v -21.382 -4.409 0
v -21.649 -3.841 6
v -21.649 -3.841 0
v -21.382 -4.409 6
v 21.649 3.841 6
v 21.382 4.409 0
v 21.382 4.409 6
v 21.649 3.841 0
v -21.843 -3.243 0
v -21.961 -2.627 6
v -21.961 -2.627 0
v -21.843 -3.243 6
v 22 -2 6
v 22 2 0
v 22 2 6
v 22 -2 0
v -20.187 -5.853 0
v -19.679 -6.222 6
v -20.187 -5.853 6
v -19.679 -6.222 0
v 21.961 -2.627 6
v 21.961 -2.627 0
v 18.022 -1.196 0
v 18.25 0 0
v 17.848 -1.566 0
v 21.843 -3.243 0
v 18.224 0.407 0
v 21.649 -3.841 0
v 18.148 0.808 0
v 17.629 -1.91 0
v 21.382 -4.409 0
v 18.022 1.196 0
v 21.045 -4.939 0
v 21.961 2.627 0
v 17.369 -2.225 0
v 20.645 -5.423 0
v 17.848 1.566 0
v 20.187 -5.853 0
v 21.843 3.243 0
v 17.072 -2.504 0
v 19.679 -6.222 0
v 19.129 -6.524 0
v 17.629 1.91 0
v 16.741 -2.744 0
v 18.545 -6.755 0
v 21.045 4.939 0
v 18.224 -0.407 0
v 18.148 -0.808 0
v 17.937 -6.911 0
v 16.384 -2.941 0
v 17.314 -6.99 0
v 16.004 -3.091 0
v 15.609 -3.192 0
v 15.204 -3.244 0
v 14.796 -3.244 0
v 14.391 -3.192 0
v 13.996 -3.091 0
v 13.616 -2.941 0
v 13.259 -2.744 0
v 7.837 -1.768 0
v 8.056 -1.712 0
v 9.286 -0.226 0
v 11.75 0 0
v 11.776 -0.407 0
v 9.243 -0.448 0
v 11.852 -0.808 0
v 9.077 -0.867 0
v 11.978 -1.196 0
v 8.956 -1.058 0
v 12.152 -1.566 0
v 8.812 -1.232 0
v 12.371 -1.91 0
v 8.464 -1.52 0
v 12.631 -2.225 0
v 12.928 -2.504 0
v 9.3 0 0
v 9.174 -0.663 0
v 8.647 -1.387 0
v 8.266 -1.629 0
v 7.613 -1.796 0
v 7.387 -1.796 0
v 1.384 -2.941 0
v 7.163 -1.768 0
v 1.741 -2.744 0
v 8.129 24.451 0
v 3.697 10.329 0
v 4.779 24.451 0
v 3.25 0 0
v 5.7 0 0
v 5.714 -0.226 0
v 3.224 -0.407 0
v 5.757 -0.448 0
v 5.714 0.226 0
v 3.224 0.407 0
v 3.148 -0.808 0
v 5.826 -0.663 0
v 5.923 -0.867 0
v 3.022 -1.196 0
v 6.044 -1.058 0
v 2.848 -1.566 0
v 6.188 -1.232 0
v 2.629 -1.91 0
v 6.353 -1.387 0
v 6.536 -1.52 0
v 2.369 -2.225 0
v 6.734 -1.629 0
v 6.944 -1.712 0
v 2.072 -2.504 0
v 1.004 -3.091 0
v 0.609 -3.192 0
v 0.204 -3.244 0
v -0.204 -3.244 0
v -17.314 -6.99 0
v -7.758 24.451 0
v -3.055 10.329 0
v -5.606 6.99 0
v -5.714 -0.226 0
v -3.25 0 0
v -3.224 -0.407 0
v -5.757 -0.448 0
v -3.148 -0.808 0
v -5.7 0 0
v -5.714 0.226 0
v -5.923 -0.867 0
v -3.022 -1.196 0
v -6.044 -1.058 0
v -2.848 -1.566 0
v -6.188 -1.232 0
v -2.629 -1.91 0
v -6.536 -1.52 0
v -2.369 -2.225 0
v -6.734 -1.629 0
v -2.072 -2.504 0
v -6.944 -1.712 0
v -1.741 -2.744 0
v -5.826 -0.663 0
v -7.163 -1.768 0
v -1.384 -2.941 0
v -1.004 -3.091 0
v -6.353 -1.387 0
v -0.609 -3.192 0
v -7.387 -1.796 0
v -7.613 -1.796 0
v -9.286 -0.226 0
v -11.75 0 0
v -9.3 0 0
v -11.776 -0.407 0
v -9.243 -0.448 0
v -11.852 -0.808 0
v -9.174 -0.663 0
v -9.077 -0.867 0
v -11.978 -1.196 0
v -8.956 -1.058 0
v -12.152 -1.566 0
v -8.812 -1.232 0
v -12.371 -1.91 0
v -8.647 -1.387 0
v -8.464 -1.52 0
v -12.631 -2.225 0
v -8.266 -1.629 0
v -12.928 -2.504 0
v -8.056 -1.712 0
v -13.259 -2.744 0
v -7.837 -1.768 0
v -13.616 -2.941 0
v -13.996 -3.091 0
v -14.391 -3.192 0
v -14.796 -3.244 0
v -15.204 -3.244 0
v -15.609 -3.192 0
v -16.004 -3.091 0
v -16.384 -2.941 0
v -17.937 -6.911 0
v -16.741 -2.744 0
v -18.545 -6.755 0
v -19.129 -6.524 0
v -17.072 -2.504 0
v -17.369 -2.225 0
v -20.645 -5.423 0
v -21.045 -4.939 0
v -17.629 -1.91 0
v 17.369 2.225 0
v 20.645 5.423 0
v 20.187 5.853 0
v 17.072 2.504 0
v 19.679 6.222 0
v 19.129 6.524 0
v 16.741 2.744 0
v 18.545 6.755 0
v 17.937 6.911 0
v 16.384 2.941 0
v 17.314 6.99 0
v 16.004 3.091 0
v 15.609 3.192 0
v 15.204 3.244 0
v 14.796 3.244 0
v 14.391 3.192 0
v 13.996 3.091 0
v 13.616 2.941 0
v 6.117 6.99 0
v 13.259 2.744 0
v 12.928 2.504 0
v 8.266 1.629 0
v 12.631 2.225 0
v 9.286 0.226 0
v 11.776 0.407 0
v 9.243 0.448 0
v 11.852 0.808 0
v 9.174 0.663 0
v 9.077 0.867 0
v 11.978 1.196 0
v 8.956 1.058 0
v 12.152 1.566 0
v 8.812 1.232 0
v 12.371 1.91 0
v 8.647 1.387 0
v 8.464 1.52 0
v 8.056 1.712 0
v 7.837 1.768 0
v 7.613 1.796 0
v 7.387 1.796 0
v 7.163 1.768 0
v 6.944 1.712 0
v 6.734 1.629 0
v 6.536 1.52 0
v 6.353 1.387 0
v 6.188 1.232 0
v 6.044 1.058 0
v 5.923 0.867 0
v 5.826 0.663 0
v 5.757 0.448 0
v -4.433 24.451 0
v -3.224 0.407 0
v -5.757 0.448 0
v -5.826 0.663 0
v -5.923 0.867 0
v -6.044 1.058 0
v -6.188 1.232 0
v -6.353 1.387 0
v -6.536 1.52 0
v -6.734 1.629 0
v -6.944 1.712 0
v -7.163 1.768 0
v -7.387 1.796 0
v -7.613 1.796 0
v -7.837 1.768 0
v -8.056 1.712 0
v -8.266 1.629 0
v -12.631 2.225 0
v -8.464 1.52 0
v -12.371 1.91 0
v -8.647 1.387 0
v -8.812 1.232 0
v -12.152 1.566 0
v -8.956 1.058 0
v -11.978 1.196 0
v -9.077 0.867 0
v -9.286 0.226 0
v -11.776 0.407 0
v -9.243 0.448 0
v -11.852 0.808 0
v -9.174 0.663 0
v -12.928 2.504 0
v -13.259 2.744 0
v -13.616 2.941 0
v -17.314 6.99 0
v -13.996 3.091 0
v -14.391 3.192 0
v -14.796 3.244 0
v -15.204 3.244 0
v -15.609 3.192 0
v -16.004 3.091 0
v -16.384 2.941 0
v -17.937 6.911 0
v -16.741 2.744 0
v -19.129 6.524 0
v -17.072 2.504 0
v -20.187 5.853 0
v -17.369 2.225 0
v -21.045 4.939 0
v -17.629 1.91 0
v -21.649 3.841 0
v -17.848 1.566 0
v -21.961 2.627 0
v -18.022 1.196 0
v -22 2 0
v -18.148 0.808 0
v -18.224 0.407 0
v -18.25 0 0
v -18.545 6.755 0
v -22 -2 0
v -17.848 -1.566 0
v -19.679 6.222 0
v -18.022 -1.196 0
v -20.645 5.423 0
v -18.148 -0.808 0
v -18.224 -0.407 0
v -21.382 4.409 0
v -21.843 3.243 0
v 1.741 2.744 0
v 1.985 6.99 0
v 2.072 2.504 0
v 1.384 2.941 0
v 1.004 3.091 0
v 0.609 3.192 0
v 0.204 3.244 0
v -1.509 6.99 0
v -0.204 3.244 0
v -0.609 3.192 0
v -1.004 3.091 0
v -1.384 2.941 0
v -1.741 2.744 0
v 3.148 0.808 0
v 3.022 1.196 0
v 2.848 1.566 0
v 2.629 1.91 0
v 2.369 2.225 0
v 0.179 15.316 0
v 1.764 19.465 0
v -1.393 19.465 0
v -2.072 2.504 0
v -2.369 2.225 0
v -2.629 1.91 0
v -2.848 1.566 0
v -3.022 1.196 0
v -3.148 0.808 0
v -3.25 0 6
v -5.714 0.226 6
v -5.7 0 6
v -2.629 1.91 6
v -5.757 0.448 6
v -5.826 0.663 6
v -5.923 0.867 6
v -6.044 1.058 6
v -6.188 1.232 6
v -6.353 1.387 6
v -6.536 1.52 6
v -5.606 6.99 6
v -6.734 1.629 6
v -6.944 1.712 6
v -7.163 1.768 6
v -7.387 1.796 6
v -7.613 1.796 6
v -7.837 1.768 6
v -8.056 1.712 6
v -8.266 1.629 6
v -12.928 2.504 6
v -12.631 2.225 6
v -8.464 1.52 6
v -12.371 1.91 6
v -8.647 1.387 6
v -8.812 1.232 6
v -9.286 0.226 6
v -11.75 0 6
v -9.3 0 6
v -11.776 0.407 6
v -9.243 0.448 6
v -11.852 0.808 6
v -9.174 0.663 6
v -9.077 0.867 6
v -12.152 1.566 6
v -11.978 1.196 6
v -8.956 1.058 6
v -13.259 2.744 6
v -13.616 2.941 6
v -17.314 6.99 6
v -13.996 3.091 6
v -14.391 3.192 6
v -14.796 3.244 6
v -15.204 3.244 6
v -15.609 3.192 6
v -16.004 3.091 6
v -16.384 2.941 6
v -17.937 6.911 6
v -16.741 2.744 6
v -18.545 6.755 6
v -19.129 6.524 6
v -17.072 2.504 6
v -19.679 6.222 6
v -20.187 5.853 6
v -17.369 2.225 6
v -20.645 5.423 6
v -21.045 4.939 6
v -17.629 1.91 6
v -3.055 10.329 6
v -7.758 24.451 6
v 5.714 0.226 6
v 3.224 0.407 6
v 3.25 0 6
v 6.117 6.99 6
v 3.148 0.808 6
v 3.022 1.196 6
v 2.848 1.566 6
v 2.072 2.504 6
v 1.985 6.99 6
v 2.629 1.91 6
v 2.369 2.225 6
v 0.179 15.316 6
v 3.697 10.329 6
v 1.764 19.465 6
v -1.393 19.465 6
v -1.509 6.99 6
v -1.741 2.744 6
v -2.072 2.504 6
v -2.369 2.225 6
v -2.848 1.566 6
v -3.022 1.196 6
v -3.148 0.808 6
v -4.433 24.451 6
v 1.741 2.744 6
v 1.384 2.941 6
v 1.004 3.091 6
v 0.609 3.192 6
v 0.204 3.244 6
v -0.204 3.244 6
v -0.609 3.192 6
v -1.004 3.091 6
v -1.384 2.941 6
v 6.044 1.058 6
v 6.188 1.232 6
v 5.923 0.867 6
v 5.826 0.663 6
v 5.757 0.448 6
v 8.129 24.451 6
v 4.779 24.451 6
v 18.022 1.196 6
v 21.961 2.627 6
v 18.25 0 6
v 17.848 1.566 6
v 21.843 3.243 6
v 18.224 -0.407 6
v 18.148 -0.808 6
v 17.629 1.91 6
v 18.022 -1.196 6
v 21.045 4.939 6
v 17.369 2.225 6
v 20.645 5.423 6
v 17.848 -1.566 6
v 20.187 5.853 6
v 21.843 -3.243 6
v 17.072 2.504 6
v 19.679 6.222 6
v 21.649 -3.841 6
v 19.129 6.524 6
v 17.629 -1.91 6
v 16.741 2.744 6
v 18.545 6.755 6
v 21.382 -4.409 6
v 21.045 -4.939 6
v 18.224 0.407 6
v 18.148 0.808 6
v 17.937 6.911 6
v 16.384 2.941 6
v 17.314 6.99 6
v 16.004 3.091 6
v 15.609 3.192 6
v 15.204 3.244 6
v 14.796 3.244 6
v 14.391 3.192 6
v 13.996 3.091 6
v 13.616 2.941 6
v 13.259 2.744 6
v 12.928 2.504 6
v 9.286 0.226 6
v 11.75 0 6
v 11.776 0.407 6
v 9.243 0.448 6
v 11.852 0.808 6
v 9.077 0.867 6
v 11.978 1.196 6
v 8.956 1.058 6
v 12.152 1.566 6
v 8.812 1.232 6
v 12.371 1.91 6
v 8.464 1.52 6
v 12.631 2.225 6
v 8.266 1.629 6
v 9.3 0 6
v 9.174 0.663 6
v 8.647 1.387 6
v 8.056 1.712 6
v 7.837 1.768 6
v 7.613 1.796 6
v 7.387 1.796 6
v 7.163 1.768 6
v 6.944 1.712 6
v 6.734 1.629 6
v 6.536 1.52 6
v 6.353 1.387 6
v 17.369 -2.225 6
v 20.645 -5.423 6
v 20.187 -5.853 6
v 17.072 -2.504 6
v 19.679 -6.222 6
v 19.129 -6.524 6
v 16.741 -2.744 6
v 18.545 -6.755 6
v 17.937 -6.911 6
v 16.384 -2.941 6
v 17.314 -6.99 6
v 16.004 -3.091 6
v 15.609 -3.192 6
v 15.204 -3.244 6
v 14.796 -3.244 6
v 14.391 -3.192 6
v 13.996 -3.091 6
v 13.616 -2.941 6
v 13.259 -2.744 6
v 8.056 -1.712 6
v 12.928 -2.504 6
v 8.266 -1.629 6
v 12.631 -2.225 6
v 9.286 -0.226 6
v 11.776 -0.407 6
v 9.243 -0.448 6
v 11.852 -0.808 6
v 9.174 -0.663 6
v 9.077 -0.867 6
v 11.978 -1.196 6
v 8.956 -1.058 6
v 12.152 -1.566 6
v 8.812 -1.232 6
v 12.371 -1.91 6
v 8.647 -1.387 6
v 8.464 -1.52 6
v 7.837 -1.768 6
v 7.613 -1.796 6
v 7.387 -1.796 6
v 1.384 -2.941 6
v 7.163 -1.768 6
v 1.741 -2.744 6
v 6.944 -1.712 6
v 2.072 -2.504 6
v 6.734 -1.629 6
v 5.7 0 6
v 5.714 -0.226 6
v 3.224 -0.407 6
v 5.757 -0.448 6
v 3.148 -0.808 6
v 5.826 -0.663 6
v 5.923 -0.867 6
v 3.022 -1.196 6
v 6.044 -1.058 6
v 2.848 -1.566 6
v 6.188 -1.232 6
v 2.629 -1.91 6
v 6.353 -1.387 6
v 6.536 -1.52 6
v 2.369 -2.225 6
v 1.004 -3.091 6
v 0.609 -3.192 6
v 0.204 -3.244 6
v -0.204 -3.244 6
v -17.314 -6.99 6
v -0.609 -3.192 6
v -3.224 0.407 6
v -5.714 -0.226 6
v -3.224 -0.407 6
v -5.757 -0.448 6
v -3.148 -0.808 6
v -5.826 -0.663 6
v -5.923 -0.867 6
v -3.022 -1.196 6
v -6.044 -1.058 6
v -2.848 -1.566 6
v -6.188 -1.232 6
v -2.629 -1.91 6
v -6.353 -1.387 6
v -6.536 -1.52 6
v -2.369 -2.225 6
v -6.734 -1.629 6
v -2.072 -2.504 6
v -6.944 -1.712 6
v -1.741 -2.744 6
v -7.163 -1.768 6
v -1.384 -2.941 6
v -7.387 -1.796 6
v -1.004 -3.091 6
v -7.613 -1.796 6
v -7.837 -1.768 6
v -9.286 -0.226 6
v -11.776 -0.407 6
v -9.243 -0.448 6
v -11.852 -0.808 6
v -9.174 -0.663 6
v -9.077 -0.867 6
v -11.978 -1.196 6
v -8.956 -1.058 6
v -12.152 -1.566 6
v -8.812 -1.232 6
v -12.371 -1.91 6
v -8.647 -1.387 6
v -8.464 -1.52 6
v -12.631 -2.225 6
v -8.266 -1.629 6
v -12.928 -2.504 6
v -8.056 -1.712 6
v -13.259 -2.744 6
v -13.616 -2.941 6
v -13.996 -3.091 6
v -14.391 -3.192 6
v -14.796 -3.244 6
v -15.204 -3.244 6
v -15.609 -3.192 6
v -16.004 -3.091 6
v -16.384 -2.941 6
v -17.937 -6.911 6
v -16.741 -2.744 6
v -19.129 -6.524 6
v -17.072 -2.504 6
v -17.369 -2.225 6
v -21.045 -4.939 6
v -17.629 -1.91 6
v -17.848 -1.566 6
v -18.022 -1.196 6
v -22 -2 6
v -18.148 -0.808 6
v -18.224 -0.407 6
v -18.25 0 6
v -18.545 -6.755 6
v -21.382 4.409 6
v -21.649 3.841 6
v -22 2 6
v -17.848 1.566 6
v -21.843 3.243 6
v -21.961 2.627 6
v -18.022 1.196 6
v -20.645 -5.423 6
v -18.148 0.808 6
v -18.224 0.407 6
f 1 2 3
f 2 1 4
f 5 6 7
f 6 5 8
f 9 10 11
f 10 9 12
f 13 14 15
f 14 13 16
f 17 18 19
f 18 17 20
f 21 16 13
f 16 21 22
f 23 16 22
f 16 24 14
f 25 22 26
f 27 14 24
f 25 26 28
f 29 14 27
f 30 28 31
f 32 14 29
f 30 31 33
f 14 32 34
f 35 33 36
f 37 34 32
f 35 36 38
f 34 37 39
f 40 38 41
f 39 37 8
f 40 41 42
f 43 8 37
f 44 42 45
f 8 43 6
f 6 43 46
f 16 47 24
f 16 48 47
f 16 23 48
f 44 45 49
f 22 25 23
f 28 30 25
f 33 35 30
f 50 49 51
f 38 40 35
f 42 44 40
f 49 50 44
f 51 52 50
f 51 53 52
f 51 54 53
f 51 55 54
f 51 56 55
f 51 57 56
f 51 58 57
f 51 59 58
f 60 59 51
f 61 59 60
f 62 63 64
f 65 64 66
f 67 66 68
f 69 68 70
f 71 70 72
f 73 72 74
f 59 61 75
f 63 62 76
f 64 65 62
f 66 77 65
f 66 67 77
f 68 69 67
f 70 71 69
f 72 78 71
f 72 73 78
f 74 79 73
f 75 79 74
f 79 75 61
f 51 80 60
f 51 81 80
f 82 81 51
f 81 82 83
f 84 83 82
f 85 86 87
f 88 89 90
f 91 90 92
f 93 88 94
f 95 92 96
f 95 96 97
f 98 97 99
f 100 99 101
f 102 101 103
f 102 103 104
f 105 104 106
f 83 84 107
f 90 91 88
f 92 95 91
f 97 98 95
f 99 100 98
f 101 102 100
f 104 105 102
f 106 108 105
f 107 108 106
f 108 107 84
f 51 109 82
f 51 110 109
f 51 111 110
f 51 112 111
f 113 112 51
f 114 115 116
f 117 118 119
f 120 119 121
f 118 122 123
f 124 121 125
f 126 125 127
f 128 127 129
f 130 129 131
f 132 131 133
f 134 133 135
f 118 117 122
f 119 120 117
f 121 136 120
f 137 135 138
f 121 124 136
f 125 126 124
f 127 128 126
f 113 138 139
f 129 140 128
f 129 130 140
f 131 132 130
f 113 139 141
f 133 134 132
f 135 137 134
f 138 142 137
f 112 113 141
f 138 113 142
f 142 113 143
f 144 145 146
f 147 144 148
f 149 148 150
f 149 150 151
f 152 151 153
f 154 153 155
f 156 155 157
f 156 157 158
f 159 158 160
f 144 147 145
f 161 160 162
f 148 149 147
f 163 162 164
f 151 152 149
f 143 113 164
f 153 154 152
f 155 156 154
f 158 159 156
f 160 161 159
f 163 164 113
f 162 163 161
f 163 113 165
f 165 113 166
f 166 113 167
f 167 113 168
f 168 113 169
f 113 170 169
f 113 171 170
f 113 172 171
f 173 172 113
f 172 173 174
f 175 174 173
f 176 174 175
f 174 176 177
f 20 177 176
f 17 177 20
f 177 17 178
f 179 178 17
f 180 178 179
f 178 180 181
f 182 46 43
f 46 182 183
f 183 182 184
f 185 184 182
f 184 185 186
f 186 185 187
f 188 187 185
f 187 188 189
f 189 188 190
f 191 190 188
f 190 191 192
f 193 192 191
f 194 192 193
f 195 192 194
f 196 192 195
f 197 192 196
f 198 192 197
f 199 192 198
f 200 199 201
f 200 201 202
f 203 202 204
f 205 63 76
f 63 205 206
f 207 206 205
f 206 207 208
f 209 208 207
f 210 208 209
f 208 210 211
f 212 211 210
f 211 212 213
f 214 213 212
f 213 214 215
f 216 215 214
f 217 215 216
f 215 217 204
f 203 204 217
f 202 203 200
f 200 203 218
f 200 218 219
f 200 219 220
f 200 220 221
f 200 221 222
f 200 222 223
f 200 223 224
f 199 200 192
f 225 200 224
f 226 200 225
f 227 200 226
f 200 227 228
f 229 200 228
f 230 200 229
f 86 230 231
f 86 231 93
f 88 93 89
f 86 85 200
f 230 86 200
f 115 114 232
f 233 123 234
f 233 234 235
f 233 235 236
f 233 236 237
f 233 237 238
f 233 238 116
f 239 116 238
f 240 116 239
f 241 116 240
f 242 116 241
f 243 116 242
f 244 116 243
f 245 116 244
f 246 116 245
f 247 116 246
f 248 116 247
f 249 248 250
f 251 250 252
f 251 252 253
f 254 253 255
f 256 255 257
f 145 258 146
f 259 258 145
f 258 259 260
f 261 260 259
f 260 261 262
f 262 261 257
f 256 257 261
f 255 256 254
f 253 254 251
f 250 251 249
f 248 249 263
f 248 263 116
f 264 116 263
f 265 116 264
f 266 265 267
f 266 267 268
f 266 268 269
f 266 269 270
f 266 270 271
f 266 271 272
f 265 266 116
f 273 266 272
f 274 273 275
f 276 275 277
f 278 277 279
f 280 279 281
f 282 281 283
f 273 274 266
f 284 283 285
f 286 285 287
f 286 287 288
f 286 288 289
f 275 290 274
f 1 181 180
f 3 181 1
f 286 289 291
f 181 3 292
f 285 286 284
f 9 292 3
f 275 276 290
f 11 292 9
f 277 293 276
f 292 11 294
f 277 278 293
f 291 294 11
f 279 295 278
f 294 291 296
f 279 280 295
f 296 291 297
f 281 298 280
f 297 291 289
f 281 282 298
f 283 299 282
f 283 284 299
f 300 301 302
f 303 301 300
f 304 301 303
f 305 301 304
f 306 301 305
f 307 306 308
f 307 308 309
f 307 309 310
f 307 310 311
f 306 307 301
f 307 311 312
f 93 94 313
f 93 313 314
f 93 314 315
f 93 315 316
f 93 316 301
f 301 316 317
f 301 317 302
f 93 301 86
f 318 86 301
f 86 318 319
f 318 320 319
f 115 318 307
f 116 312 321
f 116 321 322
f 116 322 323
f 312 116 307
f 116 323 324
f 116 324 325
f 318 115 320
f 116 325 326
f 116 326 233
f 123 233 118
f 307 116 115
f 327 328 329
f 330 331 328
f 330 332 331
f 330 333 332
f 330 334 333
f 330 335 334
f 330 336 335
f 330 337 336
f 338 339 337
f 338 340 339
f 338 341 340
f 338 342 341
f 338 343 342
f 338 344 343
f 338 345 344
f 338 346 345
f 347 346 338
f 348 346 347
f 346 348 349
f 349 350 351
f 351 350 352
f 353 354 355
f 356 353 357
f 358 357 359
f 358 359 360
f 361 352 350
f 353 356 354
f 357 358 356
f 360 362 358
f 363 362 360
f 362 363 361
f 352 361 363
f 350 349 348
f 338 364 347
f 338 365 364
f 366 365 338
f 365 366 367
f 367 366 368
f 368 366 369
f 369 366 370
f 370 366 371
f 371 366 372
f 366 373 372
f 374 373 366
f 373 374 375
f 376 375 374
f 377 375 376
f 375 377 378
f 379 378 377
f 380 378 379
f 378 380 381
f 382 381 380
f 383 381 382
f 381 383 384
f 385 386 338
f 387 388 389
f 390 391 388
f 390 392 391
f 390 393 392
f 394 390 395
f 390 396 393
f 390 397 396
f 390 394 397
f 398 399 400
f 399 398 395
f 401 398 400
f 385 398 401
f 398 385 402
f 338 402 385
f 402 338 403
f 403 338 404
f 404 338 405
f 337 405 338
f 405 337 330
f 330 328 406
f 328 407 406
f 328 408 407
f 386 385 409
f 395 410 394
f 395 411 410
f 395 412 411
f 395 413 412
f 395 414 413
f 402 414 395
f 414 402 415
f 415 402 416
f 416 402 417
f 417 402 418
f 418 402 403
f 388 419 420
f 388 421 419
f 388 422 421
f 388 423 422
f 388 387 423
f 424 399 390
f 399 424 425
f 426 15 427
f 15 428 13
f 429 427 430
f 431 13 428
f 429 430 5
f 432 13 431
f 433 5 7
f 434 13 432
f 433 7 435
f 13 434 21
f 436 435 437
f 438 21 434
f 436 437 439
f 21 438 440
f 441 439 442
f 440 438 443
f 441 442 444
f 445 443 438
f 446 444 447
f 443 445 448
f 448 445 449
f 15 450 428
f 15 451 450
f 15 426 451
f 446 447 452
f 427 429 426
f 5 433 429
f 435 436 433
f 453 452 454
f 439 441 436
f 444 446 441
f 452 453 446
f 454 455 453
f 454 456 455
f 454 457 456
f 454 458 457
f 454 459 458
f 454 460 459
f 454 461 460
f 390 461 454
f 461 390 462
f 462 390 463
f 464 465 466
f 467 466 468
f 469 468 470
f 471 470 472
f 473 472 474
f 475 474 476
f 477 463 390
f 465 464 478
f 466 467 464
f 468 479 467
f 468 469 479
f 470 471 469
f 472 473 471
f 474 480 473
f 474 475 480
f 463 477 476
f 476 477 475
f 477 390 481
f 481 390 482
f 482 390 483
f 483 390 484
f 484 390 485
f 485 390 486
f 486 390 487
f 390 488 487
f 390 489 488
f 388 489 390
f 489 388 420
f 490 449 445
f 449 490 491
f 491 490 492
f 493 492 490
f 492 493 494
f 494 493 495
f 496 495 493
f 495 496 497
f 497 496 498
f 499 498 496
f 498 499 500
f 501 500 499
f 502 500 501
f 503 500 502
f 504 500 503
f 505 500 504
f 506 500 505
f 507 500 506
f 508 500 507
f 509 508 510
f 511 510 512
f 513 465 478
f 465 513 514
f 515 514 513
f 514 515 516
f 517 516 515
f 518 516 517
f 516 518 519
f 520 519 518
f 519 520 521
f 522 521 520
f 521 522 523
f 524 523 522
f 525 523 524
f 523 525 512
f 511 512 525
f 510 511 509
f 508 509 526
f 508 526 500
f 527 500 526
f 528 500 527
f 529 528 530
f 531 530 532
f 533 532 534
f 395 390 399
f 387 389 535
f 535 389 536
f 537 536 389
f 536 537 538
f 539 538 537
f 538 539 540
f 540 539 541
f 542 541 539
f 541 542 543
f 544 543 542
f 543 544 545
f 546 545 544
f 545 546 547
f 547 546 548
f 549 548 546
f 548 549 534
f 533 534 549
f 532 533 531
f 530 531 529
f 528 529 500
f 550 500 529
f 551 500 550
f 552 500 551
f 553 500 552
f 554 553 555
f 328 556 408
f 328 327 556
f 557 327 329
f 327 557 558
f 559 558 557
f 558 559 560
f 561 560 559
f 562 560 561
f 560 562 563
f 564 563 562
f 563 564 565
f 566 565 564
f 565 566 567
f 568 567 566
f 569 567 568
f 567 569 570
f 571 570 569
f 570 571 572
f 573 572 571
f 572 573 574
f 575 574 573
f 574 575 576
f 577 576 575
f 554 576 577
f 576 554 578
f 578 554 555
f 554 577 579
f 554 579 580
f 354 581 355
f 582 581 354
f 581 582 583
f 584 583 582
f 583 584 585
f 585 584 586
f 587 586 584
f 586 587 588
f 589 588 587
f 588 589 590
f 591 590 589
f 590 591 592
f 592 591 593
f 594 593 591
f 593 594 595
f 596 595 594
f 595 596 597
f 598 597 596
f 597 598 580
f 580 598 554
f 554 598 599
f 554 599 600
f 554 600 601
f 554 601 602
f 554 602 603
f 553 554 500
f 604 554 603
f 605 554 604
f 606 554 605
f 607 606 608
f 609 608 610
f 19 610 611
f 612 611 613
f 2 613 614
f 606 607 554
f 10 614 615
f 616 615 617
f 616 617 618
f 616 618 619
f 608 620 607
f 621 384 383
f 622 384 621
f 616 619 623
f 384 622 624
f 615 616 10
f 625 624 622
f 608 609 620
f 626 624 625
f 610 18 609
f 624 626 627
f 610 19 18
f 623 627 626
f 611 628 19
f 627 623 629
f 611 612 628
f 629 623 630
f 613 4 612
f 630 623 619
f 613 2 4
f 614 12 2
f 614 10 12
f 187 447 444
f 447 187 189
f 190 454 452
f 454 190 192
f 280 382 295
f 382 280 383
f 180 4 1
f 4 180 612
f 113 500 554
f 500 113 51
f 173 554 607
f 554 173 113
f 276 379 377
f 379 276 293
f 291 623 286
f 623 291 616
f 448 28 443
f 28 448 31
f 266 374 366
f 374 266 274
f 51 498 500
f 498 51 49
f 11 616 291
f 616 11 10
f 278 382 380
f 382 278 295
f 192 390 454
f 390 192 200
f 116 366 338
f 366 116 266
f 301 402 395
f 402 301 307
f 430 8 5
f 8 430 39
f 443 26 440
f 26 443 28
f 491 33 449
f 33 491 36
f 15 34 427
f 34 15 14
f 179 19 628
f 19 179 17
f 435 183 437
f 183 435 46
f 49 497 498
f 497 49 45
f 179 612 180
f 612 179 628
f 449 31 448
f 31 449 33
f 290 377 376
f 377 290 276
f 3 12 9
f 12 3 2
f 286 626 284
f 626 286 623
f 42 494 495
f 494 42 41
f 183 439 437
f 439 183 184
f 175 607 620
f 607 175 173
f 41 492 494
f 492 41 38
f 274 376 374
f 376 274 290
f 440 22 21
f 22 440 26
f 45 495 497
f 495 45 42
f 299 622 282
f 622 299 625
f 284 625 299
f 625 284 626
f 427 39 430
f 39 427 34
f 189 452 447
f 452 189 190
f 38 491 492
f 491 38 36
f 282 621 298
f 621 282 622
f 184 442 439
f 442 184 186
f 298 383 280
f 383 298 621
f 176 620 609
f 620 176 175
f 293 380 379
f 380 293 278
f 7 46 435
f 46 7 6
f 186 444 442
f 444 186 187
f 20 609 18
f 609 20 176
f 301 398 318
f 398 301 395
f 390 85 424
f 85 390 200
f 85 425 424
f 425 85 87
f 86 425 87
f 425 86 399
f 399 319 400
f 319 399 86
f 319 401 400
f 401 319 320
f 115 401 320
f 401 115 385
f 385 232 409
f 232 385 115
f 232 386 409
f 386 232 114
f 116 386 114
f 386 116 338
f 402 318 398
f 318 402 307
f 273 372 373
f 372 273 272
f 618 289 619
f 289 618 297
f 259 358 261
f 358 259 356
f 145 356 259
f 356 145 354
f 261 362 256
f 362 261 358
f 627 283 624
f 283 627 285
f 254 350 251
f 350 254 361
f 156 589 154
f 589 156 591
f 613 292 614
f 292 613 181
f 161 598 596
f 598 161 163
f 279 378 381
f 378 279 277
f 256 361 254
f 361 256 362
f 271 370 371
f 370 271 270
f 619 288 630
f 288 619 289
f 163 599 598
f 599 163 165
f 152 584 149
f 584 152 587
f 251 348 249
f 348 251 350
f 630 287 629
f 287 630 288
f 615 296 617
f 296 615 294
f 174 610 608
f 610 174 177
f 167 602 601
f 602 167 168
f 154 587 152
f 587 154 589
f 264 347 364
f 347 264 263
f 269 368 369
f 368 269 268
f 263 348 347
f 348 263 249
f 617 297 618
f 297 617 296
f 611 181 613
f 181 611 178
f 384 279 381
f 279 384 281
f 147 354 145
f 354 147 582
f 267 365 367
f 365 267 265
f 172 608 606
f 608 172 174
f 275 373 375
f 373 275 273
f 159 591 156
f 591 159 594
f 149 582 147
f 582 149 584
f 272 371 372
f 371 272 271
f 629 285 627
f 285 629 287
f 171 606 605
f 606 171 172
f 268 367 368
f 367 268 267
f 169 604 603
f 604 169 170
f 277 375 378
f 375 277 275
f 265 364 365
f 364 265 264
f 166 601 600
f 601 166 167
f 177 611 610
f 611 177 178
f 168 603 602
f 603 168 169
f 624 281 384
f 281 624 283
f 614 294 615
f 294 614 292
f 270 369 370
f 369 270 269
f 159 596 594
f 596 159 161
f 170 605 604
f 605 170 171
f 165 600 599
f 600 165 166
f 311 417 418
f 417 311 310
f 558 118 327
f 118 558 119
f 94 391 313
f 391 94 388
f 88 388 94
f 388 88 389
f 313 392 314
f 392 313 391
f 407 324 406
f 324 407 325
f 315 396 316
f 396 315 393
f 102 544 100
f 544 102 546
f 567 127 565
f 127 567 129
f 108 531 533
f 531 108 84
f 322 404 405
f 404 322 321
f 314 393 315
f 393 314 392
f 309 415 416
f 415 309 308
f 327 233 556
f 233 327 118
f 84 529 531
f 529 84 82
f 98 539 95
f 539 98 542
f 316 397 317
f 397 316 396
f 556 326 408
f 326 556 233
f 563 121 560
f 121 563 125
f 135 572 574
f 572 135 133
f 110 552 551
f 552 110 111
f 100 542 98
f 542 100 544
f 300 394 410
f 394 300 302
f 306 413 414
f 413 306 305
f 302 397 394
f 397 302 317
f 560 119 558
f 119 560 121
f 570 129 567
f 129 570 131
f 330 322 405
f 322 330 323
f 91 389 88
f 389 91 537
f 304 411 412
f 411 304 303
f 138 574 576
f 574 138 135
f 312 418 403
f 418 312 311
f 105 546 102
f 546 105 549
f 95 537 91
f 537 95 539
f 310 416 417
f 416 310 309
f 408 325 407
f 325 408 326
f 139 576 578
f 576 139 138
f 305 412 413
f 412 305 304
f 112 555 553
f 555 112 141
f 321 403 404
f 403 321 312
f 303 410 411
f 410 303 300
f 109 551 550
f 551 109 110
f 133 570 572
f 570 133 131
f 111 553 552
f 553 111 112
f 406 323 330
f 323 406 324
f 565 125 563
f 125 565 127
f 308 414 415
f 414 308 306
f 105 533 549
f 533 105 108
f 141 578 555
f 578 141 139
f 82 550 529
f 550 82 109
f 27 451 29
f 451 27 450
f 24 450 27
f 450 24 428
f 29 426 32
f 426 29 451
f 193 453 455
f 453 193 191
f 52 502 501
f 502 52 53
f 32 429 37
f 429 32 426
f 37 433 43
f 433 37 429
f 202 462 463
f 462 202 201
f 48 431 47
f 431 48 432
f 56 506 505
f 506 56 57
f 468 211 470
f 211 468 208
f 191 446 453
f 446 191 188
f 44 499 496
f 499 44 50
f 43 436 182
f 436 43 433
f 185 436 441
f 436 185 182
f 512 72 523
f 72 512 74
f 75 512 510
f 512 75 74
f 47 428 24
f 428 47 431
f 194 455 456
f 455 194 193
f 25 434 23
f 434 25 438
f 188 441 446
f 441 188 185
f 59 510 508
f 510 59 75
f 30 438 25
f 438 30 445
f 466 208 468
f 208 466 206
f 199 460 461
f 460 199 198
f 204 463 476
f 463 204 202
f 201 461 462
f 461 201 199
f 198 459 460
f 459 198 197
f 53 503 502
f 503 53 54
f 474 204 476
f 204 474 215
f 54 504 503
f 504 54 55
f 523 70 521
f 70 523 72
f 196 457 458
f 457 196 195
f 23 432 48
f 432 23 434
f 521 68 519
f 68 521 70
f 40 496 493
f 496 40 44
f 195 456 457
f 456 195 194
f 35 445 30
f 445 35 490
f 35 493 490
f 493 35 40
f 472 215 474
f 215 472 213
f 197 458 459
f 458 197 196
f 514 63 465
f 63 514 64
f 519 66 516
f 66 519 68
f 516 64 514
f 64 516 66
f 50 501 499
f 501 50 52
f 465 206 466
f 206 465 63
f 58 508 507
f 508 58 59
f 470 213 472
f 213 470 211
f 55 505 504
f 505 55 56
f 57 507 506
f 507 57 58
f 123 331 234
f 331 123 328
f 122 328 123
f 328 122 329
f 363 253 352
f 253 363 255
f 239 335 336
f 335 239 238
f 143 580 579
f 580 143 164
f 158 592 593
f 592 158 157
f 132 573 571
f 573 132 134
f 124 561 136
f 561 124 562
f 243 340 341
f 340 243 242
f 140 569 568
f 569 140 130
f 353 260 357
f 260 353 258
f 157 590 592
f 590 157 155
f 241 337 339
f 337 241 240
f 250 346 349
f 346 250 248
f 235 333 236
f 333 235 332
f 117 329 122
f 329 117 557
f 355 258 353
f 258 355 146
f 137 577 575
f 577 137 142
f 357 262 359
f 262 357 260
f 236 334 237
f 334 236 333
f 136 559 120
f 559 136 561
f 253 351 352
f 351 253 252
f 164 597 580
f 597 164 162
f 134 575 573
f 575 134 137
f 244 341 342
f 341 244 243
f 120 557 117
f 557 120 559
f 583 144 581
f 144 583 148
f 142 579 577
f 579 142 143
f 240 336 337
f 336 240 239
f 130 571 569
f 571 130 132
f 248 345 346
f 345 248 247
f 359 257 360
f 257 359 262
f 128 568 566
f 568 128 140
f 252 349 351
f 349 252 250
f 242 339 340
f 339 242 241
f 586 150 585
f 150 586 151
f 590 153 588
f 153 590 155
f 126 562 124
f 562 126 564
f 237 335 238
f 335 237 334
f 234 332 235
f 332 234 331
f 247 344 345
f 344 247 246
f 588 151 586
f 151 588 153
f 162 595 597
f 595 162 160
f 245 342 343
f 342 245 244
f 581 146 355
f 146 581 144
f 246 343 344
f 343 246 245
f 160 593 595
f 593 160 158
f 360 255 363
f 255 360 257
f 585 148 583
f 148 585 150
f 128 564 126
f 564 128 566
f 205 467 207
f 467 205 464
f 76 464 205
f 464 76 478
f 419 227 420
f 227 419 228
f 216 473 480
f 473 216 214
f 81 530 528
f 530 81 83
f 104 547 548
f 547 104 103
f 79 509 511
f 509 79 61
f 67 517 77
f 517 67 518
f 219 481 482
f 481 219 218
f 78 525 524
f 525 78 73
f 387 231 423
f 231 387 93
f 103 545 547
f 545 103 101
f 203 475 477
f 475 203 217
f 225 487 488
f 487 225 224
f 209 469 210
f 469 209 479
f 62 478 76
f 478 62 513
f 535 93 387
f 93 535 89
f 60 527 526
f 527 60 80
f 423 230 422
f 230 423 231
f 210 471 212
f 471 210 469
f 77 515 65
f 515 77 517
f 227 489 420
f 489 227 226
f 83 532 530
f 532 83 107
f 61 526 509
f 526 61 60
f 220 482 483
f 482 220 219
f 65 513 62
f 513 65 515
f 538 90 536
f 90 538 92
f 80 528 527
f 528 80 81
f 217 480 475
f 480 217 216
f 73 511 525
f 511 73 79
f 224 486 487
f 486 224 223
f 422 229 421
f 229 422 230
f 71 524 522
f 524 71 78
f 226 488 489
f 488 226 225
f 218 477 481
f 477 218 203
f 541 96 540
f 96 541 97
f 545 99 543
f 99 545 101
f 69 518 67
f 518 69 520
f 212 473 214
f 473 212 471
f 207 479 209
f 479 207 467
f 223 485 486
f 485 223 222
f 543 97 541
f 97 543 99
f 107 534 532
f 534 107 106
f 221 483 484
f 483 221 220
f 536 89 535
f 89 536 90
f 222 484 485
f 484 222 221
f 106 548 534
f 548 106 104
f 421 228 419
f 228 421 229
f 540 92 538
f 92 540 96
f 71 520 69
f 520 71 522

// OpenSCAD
$fn = 50;


difference() {
	union() {
		hull() {
			translate(v = [-17.0000000000, 2.0000000000, 0]) {
				cylinder(h = 6, r = 5);
			}
			translate(v = [17.0000000000, 2.0000000000, 0]) {
				cylinder(h = 6, r = 5);
			}
			translate(v = [-17.0000000000, -2.0000000000, 0]) {
				cylinder(h = 6, r = 5);
			}
			translate(v = [17.0000000000, -2.0000000000, 0]) {
				cylinder(h = 6, r = 5);
			}
		}
		translate(v = [0, 24, 0]) {
			linear_extrude(height = 6) {
				text(font = "DejaVu Sans Mono:style=Bold", halign = "center", size = 19.0000000000, text = "W", valign = "top");
			}
		}
	}
	union() {
		translate(v = [-15.0000000000, 0.0000000000, 0]) {
			translate(v = [0, 0, -100]) {
				cylinder(h = 200, r = 3.2500000000);
			}
		}
		translate(v = [0, 0, -100]) {
			cylinder(h = 200, r = 3.2500000000);
		}
		translate(v = [15.0000000000, 0.0000000000, 0]) {
			translate(v = [0, 0, -100]) {
				cylinder(h = 200, r = 3.2500000000);
			}
		}
		translate(v = [-15.0000000000, 0.0000000000, 0]) {
			translate(v = [0, 0, -100]) {
				cylinder(h = 200, r = 1.8000000000);
			}
		}
		translate(v = [-7.5000000000, 0.0000000000, 0]) {
			translate(v = [0, 0, -100]) {
				cylinder(h = 200, r = 1.8000000000);
			}
		}
		translate(v = [0, 0, -100]) {
			cylinder(h = 200, r = 1.8000000000);
		}
		translate(v = [7.5000000000, 0.0000000000, 0]) {
			translate(v = [0, 0, -100]) {
				cylinder(h = 200, r = 1.8000000000);
			}
		}
		translate(v = [15.0000000000, 0.0000000000, 0]) {
			translate(v = [0, 0, -100]) {
				cylinder(h = 200, r = 1.8000000000);
			}
		}
	}
}
